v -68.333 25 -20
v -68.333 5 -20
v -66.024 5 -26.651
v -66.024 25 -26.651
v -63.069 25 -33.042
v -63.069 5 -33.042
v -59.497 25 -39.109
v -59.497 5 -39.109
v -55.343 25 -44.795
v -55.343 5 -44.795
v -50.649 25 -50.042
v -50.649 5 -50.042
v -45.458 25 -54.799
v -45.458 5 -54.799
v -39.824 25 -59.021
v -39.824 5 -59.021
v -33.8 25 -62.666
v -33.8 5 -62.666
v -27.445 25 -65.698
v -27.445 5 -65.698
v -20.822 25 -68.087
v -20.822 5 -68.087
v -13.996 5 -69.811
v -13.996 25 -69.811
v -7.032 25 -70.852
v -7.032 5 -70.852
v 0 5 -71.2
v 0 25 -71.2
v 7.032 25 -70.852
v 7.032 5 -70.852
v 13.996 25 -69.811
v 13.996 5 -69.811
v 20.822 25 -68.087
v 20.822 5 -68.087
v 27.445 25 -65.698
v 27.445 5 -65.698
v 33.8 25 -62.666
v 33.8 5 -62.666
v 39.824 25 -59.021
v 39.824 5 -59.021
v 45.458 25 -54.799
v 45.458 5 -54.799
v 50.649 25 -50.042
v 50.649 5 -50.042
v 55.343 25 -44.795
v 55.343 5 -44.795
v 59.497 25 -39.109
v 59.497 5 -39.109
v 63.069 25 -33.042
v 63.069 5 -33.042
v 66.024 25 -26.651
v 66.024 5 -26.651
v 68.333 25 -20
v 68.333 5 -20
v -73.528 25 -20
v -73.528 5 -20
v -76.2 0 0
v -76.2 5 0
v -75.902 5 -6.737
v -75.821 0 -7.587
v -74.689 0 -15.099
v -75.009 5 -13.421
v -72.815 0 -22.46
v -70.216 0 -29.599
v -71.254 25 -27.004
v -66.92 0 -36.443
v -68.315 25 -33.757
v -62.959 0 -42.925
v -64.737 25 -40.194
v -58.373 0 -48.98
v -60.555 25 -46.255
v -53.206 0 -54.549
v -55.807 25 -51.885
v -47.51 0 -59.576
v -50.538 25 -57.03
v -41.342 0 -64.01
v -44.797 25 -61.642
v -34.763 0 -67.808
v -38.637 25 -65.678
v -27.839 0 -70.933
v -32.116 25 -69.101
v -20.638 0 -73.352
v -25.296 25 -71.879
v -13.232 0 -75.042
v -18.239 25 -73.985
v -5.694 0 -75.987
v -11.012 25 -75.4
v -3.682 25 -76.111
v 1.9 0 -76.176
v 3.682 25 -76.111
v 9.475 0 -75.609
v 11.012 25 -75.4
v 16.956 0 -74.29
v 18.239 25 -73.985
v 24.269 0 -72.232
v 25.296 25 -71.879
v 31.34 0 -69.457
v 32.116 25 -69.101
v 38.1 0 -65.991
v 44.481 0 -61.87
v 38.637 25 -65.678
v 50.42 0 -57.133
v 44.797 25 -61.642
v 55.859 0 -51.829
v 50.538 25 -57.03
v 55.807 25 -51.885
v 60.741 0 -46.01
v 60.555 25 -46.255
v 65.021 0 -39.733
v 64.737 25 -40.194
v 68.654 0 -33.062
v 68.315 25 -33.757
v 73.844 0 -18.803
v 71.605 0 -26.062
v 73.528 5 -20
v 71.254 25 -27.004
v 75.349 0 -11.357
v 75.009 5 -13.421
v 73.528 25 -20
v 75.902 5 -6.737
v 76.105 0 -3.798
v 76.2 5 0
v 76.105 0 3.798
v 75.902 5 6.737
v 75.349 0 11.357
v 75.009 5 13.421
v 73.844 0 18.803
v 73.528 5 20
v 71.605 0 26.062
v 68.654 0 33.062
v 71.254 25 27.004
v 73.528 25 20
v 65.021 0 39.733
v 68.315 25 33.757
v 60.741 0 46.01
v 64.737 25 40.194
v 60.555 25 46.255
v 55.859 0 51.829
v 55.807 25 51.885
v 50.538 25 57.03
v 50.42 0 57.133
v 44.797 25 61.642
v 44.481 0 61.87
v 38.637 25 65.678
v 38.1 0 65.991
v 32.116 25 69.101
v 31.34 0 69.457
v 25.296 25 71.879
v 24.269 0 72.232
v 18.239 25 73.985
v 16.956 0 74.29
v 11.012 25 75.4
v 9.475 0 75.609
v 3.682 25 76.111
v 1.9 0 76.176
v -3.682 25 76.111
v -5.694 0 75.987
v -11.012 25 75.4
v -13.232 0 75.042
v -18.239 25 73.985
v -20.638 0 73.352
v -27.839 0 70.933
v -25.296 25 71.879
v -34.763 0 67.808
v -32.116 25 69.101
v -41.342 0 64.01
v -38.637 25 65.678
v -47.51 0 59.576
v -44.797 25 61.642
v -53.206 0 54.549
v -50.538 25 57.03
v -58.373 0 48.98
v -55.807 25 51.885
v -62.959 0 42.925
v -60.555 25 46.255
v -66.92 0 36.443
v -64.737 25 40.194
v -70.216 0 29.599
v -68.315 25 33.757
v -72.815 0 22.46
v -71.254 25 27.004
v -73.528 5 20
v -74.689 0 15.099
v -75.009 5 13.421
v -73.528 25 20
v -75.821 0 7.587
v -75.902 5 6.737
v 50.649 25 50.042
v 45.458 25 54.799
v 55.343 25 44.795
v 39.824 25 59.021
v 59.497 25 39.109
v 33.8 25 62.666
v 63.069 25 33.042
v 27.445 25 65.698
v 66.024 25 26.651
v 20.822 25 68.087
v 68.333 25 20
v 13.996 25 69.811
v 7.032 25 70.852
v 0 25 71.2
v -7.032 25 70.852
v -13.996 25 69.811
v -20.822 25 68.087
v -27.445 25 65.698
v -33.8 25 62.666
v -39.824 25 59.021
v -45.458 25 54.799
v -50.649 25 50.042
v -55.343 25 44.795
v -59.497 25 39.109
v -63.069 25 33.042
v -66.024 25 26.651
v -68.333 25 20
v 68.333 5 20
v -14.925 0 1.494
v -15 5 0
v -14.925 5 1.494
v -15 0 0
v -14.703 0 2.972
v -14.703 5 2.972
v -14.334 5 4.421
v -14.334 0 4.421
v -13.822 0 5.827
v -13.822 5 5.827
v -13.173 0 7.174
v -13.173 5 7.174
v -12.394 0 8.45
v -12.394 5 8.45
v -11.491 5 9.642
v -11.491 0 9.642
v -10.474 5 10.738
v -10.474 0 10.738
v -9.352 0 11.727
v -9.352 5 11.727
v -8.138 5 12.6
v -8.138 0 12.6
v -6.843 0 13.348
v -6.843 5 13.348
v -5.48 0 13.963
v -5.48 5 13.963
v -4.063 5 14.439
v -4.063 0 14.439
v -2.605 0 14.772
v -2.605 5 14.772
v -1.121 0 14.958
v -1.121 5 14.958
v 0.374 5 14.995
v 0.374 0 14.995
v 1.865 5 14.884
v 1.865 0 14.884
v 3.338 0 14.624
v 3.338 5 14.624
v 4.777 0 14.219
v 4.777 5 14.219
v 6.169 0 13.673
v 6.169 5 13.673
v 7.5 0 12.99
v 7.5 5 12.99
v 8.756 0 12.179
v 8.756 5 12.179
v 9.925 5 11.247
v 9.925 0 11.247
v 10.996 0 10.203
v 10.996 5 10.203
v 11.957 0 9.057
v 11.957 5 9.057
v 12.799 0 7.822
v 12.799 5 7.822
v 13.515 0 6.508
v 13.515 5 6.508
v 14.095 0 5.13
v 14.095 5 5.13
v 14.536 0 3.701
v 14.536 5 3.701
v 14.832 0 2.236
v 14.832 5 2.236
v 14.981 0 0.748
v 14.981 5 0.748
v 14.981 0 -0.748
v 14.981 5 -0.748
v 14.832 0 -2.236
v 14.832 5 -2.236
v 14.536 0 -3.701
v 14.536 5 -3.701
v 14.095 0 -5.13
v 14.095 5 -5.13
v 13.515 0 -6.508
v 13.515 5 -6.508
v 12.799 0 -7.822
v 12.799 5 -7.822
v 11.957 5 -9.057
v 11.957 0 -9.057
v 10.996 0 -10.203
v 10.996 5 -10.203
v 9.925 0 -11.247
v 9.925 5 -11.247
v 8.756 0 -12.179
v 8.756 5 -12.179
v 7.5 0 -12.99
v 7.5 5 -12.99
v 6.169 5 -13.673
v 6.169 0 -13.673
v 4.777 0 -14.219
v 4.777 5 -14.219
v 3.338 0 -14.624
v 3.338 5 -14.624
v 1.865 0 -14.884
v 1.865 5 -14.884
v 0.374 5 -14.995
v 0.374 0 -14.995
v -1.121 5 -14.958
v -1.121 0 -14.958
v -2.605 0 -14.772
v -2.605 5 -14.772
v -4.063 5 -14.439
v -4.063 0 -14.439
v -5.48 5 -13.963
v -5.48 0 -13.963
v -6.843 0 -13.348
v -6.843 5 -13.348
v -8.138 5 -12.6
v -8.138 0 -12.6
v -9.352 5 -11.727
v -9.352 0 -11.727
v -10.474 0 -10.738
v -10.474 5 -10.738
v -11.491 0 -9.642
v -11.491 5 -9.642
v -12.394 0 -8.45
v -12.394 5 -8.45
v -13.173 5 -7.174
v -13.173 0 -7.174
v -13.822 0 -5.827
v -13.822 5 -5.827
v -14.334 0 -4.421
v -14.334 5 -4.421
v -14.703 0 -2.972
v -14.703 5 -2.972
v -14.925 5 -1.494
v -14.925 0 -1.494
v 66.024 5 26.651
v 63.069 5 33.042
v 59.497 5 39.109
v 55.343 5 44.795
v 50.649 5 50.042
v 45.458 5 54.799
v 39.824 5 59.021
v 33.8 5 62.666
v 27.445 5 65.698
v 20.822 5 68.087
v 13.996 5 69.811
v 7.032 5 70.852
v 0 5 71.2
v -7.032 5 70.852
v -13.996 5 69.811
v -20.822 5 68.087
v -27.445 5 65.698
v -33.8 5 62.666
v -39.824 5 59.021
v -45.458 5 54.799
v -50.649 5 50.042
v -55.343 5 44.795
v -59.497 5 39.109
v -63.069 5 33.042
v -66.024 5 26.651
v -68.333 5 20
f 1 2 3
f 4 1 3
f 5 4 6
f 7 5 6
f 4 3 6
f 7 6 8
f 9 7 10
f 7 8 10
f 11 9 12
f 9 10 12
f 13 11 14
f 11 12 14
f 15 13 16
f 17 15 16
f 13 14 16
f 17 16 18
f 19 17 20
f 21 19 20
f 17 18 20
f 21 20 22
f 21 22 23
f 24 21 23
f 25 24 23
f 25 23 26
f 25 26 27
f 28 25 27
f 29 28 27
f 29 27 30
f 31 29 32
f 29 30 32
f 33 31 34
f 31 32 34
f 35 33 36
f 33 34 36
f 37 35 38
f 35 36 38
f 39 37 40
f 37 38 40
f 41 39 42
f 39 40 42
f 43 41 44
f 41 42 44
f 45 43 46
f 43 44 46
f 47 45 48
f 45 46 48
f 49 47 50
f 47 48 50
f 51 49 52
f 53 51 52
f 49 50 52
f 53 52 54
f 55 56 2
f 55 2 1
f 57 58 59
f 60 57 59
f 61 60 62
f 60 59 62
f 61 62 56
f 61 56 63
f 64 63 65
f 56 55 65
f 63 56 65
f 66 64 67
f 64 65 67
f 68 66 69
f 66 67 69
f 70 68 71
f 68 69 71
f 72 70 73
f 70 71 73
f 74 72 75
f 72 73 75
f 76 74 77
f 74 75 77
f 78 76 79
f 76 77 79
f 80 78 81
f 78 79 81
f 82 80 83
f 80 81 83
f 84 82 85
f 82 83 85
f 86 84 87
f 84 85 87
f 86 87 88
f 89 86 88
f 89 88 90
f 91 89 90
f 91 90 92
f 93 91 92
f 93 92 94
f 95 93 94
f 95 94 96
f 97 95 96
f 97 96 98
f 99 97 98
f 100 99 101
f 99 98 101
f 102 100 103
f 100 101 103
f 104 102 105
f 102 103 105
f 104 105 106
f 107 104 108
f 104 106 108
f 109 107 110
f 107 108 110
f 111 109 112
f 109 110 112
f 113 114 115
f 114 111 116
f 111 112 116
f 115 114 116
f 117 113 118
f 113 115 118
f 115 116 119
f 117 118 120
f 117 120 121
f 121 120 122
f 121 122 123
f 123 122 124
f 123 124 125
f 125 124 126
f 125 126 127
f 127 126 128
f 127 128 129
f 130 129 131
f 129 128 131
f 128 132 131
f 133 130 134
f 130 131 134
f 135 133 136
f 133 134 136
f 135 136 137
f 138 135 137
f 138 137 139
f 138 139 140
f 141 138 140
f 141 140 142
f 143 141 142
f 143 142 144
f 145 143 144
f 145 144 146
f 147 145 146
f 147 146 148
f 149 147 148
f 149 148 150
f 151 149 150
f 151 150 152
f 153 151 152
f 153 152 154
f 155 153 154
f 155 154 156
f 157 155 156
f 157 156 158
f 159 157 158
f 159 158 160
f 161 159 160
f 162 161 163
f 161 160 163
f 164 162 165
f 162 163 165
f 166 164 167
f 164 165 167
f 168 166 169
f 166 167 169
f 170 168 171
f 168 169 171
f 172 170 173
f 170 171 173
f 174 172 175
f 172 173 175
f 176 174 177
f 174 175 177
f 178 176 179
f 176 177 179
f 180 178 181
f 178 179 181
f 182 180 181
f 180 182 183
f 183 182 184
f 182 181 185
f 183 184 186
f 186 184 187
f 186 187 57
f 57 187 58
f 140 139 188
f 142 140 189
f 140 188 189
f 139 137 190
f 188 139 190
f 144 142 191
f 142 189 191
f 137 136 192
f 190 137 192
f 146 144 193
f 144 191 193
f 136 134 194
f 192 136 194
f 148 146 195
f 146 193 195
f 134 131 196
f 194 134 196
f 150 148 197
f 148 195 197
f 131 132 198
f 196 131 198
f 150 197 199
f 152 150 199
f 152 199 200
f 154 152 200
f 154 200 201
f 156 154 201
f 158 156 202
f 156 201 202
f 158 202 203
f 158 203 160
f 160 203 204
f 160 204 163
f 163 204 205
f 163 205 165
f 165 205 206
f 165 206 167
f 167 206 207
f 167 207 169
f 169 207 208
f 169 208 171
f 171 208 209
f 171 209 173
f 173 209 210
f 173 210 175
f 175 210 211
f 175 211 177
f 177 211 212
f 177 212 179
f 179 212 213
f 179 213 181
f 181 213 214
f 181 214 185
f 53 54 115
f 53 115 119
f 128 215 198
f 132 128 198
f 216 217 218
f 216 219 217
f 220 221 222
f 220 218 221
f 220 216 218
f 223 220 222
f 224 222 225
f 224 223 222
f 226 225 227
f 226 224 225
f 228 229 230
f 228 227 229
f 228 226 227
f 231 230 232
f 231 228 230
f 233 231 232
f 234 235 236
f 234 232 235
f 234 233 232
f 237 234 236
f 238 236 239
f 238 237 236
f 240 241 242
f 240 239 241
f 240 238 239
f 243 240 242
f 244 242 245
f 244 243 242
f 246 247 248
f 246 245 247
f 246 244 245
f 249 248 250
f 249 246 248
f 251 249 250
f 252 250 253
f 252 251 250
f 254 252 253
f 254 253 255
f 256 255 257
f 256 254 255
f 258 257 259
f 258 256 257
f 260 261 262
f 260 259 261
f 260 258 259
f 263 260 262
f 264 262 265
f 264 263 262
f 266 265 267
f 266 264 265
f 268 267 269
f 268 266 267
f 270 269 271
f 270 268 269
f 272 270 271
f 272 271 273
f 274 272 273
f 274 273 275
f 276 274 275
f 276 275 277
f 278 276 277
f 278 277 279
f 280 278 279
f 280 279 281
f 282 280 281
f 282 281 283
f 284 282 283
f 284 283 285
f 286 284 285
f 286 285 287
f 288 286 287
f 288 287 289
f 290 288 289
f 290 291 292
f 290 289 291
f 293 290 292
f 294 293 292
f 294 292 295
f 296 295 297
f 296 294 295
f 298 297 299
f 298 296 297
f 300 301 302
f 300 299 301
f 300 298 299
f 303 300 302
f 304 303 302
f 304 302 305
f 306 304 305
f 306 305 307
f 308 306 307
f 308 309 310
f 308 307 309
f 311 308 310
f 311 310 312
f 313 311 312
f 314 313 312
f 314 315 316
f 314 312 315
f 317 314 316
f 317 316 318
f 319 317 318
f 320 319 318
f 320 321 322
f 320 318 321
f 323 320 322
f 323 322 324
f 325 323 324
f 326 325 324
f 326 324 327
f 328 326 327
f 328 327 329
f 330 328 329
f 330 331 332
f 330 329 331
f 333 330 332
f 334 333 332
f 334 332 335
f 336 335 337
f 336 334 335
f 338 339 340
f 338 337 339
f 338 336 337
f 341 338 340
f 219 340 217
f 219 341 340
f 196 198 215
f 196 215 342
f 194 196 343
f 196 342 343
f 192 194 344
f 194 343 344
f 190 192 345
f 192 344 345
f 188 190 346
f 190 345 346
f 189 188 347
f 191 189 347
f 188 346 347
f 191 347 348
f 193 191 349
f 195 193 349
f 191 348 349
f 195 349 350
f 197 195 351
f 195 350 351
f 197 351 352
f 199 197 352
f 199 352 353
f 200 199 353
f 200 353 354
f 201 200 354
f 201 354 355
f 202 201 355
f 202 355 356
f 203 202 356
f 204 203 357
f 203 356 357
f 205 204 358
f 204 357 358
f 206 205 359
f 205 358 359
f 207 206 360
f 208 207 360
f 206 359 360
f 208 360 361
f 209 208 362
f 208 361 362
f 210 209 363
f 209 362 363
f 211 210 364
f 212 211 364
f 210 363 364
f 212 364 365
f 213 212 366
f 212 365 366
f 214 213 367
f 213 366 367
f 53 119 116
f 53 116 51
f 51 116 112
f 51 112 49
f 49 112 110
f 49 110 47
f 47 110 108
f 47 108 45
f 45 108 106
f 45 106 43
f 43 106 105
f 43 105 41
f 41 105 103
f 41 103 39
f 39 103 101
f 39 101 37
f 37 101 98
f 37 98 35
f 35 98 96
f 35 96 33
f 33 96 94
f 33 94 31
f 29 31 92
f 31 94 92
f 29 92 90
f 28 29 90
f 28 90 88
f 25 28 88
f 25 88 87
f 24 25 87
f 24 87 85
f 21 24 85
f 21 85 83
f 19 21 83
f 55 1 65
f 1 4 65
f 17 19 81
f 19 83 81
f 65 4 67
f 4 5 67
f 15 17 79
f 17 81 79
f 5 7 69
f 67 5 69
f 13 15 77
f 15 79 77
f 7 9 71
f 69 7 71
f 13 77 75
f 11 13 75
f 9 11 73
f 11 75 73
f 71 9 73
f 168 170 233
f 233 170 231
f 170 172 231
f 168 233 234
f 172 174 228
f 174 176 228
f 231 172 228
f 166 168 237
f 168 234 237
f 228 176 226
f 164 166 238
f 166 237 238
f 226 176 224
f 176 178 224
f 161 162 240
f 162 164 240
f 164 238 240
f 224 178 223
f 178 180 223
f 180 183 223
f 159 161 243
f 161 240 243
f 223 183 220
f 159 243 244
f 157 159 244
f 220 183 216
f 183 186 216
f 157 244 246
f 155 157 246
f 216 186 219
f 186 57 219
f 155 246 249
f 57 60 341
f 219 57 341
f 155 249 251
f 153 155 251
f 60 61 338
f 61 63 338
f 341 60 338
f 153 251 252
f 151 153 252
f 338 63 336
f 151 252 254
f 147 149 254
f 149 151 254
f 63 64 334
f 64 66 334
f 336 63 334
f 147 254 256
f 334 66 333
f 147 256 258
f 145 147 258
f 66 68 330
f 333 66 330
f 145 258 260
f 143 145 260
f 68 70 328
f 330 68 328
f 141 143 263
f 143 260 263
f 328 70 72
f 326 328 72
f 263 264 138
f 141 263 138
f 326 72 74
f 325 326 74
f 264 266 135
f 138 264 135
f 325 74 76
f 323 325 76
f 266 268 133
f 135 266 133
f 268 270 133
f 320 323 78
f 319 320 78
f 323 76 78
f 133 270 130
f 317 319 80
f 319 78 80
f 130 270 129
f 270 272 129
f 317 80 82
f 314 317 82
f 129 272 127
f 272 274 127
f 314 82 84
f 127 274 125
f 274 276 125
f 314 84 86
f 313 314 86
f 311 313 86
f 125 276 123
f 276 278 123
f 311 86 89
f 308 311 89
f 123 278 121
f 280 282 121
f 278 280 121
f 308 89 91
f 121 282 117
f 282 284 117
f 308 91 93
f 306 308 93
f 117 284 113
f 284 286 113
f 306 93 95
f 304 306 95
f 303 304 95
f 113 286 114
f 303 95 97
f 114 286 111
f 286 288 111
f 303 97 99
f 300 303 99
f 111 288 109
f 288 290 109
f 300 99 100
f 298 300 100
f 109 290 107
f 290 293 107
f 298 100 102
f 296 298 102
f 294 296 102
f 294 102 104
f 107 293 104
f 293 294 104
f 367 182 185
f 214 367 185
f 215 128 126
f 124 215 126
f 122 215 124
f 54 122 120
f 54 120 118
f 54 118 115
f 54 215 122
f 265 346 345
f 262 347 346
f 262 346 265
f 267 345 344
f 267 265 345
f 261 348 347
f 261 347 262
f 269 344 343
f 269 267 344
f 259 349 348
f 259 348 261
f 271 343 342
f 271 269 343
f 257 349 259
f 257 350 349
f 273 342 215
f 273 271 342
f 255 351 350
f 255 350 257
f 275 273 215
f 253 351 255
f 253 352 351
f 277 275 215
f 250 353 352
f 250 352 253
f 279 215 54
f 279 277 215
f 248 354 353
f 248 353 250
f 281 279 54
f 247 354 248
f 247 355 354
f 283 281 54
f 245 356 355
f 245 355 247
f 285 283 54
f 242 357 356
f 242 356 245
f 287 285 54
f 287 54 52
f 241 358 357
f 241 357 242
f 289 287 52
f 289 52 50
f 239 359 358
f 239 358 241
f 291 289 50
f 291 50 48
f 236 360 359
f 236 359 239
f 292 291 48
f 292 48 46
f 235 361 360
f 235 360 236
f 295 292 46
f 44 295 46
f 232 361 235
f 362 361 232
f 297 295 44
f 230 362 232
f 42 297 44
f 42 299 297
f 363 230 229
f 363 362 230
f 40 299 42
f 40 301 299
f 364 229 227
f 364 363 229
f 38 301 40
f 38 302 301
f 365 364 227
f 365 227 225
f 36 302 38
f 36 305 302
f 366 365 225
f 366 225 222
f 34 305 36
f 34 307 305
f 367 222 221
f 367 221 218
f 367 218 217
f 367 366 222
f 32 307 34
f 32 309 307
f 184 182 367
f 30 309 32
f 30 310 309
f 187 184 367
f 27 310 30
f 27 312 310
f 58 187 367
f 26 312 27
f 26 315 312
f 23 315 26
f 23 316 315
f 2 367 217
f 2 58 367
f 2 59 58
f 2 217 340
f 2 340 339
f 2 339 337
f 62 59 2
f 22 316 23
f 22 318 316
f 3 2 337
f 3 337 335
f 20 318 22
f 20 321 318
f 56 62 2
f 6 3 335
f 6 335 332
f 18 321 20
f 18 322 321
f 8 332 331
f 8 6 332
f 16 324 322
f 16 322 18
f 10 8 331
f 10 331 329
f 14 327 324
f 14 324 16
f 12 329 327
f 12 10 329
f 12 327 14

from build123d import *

# Parameters (mm, degrees)
CUT_EXTRUDE2_DEPTH      = 111.624951977
CUT_EXTRUDE2_DEPTH_BACK = 111.624951977
SKETCH2_W               = 40
SKETCH2_H               = 20
CUT_EXTRUDE3_DEPTH      = 110.603284622
CUT_EXTRUDE3_DEPTH_BACK = 110.603284622
SKETCH3_R               = 15


with BuildPart() as part:
    # Sketch1 → Revolve1 (revolve)
    with BuildSketch(Plane.XY):
        Polygon((0, 0), (-76.2, 0), (-76.2, 25), (-71.2, 25), (-71.2, 5), (0, 5), align=None)
    revolve(axis=Axis((0, 5, 0), (0, -1, 0)))

    # Sketch2 → Cut-Extrude2 (cut, two sides: drawn at the far end of the back side and taken through both)
    with BuildSketch(Plane(origin=(0, 0, 0), x_dir=(0, 0, -1), z_dir=(1, 0, 0)).offset(-CUT_EXTRUDE2_DEPTH_BACK)):
        with Locations((0, 15)):
            Rectangle(SKETCH2_W, SKETCH2_H)
    extrude(amount=CUT_EXTRUDE2_DEPTH + CUT_EXTRUDE2_DEPTH_BACK, mode=Mode.SUBTRACT)

    # Sketch3 → Cut-Extrude3 (cut, two sides: drawn at the far end of the back side and taken through both)
    with BuildSketch(Plane(origin=(0, 5, 0), x_dir=(1, 0, 0), z_dir=(0, 1, 0)).offset(-CUT_EXTRUDE3_DEPTH_BACK)):
        with Locations(Location((0, 0, 0), (0, 0, 180))):
            Circle(SKETCH3_R)
    extrude(amount=CUT_EXTRUDE3_DEPTH + CUT_EXTRUDE3_DEPTH_BACK, mode=Mode.SUBTRACT)


solid = part.part
